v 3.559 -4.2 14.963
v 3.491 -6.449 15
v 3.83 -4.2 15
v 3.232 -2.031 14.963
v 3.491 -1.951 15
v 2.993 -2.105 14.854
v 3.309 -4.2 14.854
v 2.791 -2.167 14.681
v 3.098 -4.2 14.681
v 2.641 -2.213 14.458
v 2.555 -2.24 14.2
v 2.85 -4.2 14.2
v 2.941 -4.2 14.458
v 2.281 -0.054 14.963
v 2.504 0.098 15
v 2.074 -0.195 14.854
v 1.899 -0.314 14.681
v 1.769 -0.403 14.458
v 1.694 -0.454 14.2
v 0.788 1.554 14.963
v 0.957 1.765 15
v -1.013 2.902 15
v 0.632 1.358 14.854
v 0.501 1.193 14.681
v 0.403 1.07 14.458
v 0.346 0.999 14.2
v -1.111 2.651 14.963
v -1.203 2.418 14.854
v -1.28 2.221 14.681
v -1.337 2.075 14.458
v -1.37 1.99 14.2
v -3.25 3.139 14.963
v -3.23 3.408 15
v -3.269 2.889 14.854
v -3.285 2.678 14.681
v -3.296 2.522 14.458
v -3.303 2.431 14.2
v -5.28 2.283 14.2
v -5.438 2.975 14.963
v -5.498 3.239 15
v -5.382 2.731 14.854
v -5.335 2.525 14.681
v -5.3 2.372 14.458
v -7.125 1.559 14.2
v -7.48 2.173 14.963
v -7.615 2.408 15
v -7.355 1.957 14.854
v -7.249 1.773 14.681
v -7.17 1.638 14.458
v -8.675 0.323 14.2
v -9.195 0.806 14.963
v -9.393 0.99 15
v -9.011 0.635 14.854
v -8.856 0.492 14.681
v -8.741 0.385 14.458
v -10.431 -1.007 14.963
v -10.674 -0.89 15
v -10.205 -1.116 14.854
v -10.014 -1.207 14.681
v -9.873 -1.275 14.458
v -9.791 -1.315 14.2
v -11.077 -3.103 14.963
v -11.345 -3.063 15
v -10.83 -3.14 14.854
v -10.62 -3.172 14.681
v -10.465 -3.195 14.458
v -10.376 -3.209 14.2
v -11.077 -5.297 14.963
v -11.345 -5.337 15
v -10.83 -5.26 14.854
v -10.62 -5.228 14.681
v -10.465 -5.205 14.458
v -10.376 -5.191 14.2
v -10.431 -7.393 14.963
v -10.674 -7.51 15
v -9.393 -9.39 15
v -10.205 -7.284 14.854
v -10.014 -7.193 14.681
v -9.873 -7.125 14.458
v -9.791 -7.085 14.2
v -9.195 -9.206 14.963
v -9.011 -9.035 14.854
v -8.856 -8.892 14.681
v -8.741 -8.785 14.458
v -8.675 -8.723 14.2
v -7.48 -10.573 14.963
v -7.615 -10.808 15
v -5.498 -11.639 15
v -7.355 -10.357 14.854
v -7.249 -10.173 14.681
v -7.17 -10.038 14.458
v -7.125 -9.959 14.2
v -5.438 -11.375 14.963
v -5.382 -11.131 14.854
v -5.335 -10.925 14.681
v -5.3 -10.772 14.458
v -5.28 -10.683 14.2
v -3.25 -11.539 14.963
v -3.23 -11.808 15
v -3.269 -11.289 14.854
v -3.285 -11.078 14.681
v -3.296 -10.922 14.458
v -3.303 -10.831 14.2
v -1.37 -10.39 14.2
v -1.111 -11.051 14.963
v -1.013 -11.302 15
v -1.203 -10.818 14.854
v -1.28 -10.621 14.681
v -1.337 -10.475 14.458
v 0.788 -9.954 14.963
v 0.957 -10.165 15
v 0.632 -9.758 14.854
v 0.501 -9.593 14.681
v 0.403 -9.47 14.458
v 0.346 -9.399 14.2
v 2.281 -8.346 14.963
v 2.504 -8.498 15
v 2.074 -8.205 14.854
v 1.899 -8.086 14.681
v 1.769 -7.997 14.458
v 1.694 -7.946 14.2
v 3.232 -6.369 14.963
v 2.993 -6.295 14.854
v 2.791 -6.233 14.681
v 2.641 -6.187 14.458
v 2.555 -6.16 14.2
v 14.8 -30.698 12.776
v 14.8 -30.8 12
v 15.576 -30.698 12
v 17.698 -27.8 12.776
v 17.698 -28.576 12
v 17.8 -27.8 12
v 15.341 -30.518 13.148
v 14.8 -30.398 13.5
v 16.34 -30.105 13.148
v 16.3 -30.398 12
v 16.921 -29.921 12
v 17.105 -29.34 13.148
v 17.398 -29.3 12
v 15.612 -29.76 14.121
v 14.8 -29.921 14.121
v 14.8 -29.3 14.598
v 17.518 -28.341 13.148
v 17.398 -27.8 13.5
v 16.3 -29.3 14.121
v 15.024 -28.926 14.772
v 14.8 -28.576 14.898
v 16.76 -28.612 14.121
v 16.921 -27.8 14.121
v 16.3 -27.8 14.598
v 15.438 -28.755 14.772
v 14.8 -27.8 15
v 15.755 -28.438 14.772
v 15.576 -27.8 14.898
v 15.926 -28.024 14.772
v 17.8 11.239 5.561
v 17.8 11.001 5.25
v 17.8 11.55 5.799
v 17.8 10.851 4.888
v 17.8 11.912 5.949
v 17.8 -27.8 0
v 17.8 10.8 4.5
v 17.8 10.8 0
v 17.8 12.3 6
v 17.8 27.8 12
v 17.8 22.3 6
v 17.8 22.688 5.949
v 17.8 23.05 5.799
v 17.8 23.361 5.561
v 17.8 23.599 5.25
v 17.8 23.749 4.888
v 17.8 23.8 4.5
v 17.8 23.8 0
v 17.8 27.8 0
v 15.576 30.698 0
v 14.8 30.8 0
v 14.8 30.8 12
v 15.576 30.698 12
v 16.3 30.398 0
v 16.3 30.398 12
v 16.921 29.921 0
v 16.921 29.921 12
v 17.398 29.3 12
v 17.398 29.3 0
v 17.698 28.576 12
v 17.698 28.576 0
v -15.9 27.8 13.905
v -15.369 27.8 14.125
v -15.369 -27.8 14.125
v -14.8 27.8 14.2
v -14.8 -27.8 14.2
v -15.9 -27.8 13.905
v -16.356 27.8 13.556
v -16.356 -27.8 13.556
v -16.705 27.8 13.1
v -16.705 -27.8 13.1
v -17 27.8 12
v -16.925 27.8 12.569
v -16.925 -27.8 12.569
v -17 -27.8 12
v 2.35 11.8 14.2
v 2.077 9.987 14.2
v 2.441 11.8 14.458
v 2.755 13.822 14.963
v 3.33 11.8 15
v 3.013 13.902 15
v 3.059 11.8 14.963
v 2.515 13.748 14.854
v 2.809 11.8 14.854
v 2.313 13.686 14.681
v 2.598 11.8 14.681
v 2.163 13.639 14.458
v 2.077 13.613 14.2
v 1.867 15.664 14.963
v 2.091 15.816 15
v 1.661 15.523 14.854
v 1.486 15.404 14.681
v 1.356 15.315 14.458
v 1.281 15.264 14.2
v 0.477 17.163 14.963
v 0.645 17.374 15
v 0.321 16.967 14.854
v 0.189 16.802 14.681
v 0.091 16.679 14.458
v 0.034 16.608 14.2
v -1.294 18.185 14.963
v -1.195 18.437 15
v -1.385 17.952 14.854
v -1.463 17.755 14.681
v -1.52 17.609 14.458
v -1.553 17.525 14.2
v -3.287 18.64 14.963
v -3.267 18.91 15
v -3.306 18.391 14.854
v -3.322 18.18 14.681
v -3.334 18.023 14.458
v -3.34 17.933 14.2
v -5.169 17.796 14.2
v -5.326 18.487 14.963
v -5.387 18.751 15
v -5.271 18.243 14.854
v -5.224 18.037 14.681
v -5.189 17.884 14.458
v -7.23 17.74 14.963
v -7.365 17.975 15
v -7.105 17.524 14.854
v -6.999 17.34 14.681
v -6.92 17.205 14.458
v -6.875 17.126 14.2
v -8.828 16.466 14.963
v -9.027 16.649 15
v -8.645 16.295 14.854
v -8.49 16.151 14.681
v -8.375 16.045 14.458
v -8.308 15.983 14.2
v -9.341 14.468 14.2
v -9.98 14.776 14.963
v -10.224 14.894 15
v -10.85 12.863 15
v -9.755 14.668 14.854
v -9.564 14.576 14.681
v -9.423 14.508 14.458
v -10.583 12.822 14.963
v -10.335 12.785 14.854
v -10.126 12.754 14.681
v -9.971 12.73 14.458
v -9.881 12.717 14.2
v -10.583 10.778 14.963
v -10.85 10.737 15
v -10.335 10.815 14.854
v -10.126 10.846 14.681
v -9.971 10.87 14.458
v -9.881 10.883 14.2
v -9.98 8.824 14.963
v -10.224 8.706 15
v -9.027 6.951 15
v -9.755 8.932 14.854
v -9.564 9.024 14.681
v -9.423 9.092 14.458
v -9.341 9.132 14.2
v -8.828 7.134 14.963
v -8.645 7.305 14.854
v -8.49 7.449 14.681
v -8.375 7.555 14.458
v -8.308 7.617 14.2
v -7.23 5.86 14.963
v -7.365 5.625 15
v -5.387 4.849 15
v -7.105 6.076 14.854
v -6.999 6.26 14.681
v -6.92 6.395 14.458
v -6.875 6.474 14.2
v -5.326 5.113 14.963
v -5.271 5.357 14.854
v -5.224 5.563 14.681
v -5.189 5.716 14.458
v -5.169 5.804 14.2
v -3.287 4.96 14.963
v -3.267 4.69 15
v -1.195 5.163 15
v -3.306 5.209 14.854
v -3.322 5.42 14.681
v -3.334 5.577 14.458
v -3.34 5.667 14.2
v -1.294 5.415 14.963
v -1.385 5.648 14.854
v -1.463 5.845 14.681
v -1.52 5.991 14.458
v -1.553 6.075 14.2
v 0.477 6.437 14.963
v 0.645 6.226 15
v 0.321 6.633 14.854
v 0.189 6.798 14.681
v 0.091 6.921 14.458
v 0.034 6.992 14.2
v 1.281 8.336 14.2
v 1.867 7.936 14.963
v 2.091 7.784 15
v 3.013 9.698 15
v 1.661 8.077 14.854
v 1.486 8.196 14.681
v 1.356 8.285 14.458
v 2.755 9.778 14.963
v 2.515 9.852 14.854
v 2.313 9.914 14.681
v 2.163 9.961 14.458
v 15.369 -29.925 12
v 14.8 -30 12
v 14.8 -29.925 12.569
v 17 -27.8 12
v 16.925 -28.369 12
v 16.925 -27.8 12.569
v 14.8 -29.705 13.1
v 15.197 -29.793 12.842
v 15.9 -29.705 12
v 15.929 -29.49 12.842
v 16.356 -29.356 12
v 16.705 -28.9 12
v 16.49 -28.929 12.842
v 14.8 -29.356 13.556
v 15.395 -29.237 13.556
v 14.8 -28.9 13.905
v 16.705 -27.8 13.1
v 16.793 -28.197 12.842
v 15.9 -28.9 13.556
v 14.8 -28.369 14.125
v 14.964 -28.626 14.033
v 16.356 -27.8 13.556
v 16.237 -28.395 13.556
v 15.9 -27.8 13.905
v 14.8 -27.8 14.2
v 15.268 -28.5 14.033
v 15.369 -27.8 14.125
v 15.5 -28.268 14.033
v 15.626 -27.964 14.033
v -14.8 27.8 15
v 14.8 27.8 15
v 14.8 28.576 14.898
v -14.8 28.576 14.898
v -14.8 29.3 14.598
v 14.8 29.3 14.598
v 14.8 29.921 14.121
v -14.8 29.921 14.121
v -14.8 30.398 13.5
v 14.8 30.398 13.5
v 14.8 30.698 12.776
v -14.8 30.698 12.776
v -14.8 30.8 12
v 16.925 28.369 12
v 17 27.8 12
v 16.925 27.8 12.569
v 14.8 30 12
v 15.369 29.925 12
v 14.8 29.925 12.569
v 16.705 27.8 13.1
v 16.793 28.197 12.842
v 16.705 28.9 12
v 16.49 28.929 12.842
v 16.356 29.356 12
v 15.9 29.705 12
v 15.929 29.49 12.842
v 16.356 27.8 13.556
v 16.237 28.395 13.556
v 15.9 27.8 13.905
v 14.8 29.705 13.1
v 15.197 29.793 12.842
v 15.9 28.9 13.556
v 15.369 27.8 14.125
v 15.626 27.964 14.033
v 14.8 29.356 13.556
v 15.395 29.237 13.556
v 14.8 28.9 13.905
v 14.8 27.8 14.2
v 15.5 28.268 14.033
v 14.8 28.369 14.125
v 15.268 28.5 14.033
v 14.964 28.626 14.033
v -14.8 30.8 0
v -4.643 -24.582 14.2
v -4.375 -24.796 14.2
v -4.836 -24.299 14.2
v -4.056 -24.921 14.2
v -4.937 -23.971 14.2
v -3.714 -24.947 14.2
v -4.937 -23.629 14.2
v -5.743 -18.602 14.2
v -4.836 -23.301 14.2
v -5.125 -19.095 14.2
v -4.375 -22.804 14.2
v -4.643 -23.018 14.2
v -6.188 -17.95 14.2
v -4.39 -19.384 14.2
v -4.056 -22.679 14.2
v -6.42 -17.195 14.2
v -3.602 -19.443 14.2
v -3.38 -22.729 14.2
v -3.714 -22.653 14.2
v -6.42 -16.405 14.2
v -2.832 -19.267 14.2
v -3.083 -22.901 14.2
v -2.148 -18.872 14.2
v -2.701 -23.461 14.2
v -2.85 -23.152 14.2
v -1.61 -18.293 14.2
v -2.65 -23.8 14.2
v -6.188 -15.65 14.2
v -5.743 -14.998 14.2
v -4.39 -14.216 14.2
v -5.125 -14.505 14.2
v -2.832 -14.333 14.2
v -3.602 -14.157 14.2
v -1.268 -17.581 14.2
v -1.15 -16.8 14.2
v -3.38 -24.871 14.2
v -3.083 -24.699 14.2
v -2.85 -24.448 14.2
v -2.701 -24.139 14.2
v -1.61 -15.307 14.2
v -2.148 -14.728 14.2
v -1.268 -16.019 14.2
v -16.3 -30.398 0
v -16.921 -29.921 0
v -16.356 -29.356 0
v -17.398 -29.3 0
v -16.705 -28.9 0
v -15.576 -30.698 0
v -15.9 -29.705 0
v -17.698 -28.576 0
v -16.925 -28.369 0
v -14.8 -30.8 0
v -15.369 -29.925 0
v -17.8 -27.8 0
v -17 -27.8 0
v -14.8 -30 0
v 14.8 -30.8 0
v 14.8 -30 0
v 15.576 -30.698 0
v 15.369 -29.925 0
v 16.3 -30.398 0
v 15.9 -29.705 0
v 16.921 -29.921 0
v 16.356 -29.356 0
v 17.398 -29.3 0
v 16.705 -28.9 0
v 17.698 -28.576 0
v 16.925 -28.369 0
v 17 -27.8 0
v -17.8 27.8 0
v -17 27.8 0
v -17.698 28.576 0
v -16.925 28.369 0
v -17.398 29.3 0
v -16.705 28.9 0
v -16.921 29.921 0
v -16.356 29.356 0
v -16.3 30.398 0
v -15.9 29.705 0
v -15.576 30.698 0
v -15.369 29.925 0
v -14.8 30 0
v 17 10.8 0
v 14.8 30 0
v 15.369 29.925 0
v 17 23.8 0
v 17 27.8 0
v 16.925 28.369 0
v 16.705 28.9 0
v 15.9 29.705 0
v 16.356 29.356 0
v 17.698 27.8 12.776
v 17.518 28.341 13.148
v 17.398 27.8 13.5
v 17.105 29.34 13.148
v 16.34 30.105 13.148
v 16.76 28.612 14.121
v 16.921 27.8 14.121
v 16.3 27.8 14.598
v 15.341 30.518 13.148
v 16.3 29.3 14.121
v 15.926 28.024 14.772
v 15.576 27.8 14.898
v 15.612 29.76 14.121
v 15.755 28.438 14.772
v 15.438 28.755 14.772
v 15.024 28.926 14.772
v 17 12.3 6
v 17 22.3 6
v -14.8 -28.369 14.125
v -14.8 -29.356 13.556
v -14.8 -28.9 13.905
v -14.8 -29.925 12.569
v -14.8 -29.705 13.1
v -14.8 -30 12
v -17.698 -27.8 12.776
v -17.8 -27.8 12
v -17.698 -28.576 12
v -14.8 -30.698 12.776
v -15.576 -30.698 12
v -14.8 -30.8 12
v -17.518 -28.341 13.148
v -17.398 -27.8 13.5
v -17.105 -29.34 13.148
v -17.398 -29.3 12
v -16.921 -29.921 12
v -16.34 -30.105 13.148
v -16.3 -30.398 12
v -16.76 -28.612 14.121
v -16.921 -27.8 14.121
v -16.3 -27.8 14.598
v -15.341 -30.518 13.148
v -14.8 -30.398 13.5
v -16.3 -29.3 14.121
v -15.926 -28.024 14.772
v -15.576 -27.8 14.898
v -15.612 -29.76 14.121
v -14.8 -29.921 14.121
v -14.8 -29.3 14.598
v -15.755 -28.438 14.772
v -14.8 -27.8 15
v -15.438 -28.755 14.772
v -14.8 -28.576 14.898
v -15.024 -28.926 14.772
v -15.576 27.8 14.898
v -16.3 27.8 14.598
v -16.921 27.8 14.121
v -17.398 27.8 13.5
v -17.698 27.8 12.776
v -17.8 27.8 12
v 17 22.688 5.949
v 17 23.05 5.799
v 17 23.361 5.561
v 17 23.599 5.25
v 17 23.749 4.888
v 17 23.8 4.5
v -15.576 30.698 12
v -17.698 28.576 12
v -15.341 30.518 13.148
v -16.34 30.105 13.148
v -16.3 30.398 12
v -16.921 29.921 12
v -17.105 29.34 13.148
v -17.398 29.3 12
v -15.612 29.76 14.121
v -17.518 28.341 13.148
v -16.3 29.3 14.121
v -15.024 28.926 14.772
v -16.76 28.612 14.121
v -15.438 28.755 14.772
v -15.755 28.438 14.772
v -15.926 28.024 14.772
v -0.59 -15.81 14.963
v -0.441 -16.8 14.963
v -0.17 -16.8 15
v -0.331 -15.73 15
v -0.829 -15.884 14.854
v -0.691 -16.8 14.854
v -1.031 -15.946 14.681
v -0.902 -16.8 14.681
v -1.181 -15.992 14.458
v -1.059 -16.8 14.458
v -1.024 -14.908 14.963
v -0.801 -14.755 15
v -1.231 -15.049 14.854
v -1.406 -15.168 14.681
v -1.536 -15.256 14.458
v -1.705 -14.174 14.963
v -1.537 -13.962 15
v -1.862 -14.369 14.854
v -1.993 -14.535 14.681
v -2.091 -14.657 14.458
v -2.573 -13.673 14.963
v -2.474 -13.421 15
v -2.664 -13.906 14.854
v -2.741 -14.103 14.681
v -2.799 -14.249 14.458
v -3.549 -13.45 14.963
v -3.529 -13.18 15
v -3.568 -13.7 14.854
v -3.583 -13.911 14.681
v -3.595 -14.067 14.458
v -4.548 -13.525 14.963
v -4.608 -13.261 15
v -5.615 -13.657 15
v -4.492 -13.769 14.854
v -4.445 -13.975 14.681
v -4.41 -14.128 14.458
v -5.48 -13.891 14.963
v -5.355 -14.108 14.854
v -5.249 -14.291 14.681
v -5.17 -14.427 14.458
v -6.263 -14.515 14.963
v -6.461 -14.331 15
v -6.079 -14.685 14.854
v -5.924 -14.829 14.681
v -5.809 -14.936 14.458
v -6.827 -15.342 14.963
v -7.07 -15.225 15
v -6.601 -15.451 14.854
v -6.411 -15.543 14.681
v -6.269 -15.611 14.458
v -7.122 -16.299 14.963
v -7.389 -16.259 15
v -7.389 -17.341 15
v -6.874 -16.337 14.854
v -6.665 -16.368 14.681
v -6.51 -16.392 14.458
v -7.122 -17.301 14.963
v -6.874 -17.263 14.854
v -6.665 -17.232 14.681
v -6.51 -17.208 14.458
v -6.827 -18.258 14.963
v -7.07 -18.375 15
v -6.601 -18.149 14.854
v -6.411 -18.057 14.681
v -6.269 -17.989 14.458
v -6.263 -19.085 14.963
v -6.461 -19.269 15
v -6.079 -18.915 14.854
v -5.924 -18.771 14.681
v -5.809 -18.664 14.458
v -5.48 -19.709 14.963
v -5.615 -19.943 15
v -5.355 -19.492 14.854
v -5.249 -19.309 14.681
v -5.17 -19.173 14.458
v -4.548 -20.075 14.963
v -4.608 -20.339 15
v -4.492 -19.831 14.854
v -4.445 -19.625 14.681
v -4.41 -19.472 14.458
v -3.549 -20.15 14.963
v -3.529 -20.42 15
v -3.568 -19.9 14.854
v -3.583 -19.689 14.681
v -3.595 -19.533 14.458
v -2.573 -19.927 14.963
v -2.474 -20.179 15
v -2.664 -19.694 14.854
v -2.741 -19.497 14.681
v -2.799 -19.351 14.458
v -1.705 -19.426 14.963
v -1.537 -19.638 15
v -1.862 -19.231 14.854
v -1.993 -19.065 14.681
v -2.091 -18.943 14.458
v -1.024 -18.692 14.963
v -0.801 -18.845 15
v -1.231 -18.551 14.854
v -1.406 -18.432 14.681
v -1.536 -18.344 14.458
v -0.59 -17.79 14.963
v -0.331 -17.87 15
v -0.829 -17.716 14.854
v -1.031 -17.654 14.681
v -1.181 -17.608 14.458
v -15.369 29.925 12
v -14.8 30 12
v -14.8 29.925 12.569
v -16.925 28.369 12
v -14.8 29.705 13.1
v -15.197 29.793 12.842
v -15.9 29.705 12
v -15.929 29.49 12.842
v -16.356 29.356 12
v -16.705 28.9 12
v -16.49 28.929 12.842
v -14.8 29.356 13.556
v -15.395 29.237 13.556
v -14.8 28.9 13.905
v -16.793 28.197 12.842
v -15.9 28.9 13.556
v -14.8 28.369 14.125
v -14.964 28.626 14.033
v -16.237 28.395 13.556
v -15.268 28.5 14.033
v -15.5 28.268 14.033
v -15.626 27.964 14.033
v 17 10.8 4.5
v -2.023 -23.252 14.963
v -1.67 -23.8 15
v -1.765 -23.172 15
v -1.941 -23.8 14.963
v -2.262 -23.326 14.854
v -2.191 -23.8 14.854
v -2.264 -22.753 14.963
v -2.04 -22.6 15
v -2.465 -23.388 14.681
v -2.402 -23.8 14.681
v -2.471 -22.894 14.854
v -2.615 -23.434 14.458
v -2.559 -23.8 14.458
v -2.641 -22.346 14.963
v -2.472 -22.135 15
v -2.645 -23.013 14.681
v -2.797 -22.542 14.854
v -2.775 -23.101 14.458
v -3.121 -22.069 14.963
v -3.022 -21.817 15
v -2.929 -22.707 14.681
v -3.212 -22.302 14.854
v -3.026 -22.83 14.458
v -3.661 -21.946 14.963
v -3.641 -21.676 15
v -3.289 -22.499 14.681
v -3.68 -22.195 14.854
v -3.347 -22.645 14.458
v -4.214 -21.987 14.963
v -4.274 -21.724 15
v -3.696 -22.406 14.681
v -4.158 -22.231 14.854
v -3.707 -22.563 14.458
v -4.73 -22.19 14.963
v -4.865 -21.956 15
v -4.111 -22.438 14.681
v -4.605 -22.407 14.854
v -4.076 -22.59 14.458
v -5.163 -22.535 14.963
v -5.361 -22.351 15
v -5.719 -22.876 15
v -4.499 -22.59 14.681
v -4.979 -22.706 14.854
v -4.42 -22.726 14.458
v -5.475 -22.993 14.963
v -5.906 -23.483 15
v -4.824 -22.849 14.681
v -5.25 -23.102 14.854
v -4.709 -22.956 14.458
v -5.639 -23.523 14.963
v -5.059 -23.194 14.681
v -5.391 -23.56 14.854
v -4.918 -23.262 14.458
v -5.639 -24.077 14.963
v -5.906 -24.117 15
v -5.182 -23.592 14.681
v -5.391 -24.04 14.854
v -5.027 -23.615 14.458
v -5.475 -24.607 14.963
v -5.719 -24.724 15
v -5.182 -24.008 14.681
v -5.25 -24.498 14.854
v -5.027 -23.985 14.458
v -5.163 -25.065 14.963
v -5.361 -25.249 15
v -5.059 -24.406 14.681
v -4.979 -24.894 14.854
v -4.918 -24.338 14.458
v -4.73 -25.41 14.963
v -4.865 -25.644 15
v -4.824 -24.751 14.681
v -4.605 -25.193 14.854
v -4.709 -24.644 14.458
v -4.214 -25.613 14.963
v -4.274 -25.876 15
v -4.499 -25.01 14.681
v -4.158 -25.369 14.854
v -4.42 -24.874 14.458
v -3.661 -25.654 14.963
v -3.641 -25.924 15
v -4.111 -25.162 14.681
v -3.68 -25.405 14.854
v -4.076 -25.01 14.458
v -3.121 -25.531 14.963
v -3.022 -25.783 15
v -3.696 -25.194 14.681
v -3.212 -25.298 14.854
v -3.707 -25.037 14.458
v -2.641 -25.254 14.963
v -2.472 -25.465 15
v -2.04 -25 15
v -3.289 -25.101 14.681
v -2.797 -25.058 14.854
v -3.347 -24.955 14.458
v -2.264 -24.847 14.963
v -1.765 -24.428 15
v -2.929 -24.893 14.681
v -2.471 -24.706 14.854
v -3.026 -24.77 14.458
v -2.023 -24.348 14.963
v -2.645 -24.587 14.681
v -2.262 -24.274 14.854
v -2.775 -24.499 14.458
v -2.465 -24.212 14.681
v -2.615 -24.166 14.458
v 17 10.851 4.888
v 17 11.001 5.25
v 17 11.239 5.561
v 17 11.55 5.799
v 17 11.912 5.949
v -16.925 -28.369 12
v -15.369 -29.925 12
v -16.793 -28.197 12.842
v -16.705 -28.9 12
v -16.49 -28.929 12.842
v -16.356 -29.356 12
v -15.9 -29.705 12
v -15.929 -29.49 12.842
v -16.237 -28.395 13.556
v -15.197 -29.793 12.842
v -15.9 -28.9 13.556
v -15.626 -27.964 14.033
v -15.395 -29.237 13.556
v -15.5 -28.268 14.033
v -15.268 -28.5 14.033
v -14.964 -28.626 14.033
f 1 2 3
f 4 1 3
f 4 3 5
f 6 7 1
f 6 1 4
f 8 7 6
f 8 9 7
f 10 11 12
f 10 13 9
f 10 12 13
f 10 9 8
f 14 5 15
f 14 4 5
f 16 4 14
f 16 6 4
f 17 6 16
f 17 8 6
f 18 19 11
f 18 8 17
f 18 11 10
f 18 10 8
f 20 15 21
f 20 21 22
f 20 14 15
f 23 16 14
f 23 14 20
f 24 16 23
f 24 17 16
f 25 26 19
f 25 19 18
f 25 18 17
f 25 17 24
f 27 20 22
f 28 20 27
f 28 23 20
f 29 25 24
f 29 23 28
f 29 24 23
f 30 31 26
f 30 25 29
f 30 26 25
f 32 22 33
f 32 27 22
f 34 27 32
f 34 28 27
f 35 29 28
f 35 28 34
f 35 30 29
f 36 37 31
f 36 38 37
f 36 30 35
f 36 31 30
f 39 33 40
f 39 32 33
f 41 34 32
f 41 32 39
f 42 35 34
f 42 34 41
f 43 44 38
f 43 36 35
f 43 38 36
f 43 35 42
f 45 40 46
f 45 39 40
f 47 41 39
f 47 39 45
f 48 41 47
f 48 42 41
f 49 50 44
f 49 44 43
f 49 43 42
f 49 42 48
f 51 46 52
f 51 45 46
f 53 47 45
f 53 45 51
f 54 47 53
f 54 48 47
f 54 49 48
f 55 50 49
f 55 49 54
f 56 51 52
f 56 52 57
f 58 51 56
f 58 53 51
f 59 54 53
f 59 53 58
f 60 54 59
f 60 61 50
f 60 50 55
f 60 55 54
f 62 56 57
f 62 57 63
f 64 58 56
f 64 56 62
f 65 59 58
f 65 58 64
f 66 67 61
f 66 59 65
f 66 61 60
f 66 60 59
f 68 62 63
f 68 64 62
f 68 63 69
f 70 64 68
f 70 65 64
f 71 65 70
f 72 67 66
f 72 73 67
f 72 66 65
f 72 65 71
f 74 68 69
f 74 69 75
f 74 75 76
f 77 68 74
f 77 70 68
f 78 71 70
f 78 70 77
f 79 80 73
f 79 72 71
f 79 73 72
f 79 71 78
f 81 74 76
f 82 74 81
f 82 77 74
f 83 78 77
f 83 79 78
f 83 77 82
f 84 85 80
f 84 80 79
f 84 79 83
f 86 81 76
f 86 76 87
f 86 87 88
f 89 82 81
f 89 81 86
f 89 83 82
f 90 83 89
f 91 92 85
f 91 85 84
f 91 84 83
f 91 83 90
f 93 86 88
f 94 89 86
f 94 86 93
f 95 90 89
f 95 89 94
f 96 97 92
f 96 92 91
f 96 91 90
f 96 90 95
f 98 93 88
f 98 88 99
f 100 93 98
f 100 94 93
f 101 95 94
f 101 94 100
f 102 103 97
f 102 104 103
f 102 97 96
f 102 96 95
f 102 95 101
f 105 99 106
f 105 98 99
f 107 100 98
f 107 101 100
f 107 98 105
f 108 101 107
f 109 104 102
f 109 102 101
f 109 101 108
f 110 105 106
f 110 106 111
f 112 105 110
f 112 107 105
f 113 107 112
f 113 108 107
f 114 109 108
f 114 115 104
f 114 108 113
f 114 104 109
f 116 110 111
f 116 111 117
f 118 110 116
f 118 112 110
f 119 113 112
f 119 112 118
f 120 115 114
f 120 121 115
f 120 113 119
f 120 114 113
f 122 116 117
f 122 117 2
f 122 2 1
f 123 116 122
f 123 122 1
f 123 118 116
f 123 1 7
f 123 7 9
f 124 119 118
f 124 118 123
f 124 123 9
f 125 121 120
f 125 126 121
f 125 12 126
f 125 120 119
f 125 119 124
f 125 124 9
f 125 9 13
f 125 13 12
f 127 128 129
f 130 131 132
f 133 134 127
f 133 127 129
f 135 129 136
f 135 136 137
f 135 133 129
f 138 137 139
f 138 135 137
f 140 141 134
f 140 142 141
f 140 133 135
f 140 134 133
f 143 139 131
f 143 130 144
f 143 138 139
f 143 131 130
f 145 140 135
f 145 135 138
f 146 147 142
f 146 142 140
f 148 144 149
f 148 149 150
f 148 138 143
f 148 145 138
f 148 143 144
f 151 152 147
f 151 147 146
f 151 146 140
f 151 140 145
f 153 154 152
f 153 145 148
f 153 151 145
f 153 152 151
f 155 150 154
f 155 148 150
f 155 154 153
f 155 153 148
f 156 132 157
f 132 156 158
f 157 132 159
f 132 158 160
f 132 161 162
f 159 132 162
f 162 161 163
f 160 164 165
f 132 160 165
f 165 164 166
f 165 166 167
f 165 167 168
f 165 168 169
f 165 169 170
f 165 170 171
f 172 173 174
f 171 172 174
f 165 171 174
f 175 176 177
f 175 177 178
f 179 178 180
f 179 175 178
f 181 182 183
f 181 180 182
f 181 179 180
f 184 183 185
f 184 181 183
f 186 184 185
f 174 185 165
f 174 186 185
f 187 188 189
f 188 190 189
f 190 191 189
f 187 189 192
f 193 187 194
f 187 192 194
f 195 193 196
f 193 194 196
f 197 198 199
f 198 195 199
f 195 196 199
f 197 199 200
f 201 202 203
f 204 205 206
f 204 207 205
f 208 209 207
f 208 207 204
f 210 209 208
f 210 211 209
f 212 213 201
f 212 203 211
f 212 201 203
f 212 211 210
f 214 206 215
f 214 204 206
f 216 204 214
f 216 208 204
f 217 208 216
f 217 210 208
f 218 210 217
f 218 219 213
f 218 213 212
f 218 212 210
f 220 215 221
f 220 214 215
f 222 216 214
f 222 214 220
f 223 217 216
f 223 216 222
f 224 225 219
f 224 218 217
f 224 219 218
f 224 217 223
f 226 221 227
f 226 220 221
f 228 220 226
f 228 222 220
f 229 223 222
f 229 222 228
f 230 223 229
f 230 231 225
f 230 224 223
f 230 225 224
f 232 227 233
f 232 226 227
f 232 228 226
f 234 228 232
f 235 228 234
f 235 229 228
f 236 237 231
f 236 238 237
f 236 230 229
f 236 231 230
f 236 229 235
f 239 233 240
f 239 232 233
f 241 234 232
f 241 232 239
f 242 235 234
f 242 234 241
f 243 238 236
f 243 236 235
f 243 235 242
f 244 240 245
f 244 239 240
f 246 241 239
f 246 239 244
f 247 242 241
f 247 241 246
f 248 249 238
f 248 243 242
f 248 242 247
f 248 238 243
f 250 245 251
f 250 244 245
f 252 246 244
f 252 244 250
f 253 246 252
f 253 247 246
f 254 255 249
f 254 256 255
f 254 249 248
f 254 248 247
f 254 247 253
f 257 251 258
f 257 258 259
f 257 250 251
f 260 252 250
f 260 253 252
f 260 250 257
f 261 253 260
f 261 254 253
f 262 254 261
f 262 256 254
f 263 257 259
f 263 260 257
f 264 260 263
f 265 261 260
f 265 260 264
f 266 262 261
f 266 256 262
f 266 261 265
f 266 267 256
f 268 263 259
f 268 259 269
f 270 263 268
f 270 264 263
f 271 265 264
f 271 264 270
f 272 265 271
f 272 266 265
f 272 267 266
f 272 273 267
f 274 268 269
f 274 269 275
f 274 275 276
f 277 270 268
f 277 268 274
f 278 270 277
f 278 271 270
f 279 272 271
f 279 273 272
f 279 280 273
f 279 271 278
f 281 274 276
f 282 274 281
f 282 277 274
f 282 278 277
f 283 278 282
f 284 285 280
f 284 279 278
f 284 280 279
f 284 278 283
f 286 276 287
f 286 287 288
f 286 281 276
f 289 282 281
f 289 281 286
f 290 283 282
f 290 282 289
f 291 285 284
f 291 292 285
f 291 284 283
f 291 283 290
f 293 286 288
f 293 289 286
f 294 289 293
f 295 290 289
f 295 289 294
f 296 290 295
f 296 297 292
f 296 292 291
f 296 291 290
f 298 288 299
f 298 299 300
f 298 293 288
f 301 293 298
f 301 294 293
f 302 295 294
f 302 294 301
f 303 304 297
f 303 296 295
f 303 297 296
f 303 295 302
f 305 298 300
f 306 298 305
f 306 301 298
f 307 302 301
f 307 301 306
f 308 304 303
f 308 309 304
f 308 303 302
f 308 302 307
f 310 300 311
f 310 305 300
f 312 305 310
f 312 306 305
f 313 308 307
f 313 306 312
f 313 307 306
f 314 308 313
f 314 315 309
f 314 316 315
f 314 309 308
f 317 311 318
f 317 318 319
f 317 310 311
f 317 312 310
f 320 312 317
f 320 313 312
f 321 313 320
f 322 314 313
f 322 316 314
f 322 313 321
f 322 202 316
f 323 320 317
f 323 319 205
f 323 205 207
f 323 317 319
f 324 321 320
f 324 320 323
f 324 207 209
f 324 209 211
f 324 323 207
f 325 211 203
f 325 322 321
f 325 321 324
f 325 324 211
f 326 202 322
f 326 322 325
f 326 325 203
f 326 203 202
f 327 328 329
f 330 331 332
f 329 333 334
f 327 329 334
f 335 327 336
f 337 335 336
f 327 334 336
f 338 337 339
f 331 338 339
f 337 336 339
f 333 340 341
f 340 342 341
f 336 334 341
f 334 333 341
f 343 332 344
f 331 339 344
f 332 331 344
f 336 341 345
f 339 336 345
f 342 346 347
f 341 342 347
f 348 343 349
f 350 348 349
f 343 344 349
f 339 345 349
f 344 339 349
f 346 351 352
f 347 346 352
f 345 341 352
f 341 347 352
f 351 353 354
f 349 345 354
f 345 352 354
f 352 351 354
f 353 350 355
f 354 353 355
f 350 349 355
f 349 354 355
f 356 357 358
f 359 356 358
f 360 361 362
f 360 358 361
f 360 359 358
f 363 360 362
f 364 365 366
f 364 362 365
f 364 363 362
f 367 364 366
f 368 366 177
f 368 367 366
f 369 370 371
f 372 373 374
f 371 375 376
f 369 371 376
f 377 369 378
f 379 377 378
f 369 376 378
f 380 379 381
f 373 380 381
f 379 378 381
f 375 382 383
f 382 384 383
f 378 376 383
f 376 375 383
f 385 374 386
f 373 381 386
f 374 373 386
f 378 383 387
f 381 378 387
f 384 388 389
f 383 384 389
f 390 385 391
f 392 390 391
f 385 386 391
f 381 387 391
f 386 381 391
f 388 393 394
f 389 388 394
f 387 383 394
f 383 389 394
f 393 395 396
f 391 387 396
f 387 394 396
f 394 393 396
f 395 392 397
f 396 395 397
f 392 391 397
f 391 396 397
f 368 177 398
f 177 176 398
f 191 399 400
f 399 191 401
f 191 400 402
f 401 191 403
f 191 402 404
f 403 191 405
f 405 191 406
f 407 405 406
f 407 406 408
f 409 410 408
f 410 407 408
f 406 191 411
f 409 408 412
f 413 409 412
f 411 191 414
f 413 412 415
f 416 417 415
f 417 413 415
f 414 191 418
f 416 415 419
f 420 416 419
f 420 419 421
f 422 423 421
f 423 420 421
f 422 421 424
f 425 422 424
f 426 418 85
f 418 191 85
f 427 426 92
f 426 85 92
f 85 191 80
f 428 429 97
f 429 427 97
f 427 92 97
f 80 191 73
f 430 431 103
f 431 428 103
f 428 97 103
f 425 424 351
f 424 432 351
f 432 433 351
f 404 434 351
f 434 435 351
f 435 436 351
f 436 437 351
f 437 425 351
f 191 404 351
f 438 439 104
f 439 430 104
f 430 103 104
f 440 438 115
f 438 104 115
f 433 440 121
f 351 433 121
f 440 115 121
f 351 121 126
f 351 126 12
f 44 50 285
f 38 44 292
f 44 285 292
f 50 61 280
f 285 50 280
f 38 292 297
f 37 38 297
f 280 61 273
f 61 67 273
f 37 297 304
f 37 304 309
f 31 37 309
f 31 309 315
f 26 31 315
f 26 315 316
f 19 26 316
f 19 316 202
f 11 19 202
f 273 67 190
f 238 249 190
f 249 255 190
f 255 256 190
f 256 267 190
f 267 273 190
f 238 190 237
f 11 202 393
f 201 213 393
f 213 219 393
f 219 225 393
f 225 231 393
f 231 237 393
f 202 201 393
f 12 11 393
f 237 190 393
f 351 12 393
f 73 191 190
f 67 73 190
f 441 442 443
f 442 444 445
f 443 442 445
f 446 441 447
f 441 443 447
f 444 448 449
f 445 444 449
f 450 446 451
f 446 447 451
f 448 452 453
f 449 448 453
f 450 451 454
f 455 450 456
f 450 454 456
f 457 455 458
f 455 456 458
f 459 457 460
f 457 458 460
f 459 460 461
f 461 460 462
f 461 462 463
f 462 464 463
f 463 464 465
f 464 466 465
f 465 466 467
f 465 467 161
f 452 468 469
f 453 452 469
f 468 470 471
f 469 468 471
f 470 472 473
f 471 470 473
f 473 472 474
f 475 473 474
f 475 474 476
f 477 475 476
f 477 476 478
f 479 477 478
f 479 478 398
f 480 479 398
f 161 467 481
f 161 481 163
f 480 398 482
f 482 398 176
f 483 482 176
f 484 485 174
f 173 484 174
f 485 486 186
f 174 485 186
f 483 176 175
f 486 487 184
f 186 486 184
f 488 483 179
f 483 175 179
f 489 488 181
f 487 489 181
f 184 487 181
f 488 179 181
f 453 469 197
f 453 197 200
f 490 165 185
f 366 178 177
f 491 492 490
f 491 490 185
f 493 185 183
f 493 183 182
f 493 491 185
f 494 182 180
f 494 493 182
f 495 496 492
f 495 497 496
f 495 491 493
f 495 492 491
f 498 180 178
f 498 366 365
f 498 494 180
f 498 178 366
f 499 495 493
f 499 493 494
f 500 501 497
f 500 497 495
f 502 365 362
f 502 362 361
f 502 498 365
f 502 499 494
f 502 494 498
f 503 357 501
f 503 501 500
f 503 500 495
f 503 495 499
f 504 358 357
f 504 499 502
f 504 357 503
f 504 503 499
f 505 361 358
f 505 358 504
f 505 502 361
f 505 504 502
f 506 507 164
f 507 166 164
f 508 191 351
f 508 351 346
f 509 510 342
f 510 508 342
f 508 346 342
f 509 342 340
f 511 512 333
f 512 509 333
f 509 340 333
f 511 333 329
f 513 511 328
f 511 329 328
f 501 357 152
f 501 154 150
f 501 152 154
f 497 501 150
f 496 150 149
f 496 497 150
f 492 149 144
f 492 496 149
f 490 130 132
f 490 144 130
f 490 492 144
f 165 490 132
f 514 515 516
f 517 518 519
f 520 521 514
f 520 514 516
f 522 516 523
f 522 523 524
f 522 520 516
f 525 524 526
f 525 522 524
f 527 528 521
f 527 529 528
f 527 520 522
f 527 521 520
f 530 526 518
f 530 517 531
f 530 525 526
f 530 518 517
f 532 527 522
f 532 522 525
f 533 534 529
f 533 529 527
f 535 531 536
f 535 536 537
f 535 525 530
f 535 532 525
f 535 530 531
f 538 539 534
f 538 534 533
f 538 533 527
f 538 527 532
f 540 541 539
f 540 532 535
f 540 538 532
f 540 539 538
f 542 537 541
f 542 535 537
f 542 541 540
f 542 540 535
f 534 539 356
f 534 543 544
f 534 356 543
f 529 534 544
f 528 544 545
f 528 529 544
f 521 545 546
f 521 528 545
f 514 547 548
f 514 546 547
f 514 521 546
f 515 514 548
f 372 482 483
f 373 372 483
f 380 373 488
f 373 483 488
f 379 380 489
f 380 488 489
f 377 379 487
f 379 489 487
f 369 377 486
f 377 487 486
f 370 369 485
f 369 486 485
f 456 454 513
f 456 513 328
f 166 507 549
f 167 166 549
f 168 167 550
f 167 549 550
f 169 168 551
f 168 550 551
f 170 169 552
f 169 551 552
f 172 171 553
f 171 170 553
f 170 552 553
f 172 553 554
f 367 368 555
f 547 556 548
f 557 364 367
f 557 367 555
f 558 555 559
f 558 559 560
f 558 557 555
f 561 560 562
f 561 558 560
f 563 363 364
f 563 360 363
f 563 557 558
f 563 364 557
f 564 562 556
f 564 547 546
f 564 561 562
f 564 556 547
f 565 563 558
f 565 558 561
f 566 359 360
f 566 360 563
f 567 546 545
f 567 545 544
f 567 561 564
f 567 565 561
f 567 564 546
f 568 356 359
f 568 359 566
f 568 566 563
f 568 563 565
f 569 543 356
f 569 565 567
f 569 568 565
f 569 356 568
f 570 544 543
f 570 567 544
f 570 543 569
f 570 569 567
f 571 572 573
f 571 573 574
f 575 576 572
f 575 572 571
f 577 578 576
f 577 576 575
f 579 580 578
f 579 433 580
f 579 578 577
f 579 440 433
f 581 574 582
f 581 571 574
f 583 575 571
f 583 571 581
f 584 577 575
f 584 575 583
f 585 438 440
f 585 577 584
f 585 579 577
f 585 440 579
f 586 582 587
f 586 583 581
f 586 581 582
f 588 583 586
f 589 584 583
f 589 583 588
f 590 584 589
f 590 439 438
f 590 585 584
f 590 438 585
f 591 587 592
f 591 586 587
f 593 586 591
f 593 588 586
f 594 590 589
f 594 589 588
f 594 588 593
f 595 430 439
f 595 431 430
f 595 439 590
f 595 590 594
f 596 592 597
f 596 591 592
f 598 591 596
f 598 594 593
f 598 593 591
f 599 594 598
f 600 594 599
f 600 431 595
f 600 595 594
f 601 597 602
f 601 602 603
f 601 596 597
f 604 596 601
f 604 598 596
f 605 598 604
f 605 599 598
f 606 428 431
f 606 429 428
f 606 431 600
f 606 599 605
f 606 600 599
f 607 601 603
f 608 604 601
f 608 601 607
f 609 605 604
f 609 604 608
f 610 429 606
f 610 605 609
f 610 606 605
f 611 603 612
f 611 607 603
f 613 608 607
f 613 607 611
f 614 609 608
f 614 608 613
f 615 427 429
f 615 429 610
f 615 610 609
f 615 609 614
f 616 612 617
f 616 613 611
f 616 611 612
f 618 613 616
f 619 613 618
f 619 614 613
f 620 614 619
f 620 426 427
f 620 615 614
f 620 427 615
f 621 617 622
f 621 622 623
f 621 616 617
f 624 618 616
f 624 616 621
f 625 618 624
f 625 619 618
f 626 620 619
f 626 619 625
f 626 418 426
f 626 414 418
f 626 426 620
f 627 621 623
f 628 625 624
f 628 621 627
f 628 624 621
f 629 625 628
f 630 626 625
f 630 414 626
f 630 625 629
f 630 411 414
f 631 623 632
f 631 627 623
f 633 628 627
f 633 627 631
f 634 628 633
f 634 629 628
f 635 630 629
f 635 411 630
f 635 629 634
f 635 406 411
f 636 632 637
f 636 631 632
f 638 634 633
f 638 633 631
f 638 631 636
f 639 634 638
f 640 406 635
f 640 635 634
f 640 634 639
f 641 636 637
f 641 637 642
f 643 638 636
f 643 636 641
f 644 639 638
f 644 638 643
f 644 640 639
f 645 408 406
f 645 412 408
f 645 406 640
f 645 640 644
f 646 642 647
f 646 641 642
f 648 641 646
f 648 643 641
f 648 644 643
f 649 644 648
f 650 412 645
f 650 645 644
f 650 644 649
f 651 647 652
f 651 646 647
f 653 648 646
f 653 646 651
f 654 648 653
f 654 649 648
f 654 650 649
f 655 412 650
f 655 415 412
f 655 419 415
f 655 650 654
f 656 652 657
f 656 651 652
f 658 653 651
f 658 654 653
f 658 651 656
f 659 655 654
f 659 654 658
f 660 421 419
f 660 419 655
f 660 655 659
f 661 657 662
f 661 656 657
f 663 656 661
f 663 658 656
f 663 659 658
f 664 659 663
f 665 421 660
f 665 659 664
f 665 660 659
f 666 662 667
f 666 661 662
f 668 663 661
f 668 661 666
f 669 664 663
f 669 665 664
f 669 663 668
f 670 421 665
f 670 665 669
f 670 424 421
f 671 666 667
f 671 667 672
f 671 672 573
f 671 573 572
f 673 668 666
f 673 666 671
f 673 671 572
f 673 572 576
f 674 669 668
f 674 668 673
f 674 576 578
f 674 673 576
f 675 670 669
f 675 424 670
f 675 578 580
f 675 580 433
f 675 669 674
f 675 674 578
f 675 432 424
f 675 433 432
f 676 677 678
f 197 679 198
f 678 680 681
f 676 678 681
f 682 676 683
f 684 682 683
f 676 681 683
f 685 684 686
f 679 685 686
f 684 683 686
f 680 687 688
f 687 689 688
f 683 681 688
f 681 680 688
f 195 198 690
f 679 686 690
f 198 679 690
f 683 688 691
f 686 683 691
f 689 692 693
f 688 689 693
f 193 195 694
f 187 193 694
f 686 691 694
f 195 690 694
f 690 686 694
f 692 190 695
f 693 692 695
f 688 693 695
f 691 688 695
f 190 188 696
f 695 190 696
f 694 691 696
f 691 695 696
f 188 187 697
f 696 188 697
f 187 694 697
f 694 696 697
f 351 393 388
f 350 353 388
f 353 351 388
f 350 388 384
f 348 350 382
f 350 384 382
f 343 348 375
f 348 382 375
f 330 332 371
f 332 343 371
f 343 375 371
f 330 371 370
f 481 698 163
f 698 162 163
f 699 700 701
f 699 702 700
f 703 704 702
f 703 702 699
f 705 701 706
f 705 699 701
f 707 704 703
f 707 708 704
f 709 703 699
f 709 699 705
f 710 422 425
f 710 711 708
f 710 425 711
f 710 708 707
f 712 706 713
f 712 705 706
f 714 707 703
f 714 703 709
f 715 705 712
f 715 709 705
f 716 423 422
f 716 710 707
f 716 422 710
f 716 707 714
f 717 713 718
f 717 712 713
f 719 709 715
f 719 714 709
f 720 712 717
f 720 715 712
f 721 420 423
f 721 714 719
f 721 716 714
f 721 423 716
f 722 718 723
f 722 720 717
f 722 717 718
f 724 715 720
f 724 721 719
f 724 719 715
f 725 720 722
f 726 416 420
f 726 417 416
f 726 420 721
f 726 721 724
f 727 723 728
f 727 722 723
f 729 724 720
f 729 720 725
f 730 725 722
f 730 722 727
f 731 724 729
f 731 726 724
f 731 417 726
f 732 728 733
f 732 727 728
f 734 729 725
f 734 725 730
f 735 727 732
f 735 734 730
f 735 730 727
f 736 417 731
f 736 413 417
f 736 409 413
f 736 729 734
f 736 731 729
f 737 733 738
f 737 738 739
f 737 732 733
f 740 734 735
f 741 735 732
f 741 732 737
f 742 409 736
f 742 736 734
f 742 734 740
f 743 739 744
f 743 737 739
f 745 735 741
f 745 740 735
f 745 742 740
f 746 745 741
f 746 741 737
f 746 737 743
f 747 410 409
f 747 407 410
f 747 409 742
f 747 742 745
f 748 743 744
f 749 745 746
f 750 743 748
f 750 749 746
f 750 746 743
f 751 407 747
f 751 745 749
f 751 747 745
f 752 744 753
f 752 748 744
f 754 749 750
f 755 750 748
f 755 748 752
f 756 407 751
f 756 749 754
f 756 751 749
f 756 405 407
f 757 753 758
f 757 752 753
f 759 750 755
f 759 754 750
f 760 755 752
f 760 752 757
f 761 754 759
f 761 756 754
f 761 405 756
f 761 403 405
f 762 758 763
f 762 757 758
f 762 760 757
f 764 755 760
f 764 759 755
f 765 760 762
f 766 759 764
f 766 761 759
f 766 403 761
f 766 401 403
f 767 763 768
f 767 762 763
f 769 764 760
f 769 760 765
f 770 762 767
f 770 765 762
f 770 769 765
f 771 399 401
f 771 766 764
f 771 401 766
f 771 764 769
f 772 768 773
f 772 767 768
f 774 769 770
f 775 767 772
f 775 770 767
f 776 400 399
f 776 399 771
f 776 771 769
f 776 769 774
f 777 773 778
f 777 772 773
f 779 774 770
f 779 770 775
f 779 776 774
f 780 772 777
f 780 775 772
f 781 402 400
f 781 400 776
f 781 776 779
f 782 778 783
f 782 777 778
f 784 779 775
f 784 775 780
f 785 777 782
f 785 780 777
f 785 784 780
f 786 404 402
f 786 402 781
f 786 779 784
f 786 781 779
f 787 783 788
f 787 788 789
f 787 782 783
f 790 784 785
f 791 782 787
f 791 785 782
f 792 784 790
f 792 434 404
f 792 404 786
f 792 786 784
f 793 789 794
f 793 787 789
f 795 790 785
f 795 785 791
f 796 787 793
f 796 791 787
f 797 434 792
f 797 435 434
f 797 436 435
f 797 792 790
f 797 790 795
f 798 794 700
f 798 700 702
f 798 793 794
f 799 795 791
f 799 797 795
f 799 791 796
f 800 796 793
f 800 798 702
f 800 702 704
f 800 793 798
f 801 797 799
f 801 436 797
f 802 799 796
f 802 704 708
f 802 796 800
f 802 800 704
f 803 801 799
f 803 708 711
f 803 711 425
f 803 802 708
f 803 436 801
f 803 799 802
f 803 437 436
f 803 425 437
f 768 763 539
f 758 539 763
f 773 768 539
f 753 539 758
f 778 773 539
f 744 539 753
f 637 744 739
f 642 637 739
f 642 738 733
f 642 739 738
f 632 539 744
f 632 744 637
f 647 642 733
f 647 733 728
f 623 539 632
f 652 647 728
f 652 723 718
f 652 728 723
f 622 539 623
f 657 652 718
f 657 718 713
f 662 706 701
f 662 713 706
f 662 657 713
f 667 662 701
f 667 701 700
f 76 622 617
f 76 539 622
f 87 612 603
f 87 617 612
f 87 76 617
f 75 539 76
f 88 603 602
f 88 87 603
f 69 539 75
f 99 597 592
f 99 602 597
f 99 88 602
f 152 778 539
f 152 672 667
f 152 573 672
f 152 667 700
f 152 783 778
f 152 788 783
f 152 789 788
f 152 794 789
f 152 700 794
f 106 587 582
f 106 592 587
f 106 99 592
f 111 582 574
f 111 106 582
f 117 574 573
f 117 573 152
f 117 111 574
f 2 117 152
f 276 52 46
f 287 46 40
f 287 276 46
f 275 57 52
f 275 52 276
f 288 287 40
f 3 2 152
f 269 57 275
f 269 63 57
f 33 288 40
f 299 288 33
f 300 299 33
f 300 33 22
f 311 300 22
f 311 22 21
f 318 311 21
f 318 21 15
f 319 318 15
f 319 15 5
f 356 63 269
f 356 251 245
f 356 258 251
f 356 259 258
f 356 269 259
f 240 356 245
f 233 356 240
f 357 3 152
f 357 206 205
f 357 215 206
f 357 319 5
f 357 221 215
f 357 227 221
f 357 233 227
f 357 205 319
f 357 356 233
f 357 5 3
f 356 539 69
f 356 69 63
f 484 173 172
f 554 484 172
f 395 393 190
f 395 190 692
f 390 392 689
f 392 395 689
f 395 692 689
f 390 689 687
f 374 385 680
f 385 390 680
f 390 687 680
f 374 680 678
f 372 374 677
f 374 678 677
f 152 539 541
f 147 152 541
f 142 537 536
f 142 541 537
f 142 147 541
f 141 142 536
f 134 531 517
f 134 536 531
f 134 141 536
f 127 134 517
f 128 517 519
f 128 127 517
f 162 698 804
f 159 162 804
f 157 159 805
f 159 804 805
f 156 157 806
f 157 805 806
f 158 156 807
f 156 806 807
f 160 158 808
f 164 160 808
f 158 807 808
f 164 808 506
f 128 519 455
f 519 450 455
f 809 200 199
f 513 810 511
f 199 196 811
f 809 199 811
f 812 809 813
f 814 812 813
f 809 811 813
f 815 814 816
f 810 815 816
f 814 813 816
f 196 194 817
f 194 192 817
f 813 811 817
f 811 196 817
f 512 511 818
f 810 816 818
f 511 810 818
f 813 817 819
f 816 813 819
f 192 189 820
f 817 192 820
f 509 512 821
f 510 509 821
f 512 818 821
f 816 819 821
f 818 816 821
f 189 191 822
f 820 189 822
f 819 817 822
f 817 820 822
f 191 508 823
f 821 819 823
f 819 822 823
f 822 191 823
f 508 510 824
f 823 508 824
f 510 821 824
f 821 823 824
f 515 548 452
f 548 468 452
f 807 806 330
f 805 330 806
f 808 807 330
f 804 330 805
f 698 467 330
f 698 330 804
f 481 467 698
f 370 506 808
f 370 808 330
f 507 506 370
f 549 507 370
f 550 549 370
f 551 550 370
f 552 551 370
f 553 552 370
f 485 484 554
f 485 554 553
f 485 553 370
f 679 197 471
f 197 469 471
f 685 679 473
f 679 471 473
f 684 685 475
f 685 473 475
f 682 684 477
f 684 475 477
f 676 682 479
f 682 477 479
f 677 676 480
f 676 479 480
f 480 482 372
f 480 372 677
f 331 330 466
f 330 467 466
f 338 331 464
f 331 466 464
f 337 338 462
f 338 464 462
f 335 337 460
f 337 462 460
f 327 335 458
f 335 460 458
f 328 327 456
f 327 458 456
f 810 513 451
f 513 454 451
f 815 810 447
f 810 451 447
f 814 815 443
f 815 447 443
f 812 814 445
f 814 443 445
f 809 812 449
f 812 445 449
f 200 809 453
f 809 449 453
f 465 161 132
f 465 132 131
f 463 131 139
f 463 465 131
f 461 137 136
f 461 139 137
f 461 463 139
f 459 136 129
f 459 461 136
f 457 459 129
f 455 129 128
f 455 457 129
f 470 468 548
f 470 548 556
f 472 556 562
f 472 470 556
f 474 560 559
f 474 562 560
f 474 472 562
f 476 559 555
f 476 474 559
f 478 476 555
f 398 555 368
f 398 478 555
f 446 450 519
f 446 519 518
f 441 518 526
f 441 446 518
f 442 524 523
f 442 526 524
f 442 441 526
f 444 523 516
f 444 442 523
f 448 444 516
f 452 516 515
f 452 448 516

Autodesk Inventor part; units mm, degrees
ref_plane "YZ Plane" through (0, 0, 0) normal (1, 0, 0) x (0, 1, 0)
ref_plane "XZ Plane" through (0, 0, 0) normal (0, 1, 0) x (-1, 0, 0)
ref_plane "XY Plane" through (0, 0, 0) normal (0, 0, 1) x (1, 0, 0)
sketch "スケッチ1" plane through (0, 0, 0) normal (0, 0, 1) x (1, 0, 0)
  line L0 (17.8, -27.8) -> (17.8, 27.8) projected
  arc A0 (17.8, 27.8) -> (14.8, 30.8) centre (14.8, 27.8) ccw projected
  line L1 (14.8, 30.8) -> (-14.8, 30.8) projected
  arc A1 (-14.8, 30.8) -> (-17.8, 27.8) centre (-14.8, 27.8) ccw projected
  line L2 (-17.8, 27.8) -> (-17.8, -27.8) projected
  arc A2 (-17.8, -27.8) -> (-14.8, -30.8) centre (-14.8, -27.8) ccw projected
  line L3 (-14.8, -30.8) -> (14.8, -30.8) projected
  arc A3 (14.8, -30.8) -> (17.8, -27.8) centre (14.8, -27.8) ccw projected
  point P0 (0, 0)
extrude "押し出し1" add sketch "スケッチ1" along normal blind 15
fillet "フィレット1" radius 3 8 edges at (-16.9213, 29.9213, 15) (-17.8, 0, 15) (-16.9213, -29.9213, 15) (0, -30.8, 15) (16.9213, -29.9213, 15) (17.8, 0, 15) (16.9213, 29.9213, 15) (0, 30.8, 15)
shell "シェル1" thickness 0.8 removed faces 1 at (5.9333, 9.2667, 0)
sketch "スケッチ2" plane through (17.8, -27.8, 0) normal (1, 0, 0) x (0, 0, -1)
  line L0 (0, 51.6) -> (-6, 51.6)
  line L1 (-6, 51.6) -> (-6, 38.6)
  line L2 (-6, 38.6) -> (0, 38.6)
  line L3 (0, 38.6) -> (0, 51.6)
  line L4 (0, 58.6) -> (-12, 58.6) projected
  line L5 (0, 0) -> (0, 55.6) projected
  point P0 (0, 27.8)
  dimension "d4" = 6
  dimension "d5" = 7
  dimension "d6" = 20
extrude "押し出し2" cut sketch "スケッチ2" against normal blind 15
fillet "フィレット2" radius 1.5 2 edges at (17.4, 10.8, 6) (17.4, 23.8, 6)
sketch "スケッチ3" plane through (0, 0, 15) normal (0, 0, 1) x (1, 0, 0)
  line L0 (-17.8, 27.8) -> (-17.8, -27.8) projected
  line L1 (-14.8, -30.8) -> (14.8, -30.8) projected
  line L2 (17.8, -27.8) -> (17.8, 27.8) projected
  line L3 (14.8, 30.8) -> (-14.8, 30.8) projected
  circle A0 centre (-3.8, 11.8) radius 6.15
  circle A1 centre (-3.8, -16.8) radius 2.65
  circle A2 centre (-3.8, -4.2) radius 6.65
  circle A3 centre (-3.8, -23.8) radius 1.15
  point P0 (0, 0)
  dimension "d10" = 12.3
  dimension "d11" = 19
  dimension "d12" = 14
  dimension "d14" = 5.3
  dimension "d15" = 13.3
  dimension "d16" = 2.3
  dimension "d17" = 14
  dimension "d18" = 14
  dimension "d19" = 7
  dimension "d20" = 14
  dimension "d21" = 14
  dimension "d22" = 35
extrude "押し出し3" cut sketch "スケッチ3" against normal blind 15
fillet "フィレット3" radius 1 4 edges at (-4.95, -23.8, 15) (-6.45, -16.8, 15) (-10.45, -4.2, 15) (-9.95, 11.8, 15)
